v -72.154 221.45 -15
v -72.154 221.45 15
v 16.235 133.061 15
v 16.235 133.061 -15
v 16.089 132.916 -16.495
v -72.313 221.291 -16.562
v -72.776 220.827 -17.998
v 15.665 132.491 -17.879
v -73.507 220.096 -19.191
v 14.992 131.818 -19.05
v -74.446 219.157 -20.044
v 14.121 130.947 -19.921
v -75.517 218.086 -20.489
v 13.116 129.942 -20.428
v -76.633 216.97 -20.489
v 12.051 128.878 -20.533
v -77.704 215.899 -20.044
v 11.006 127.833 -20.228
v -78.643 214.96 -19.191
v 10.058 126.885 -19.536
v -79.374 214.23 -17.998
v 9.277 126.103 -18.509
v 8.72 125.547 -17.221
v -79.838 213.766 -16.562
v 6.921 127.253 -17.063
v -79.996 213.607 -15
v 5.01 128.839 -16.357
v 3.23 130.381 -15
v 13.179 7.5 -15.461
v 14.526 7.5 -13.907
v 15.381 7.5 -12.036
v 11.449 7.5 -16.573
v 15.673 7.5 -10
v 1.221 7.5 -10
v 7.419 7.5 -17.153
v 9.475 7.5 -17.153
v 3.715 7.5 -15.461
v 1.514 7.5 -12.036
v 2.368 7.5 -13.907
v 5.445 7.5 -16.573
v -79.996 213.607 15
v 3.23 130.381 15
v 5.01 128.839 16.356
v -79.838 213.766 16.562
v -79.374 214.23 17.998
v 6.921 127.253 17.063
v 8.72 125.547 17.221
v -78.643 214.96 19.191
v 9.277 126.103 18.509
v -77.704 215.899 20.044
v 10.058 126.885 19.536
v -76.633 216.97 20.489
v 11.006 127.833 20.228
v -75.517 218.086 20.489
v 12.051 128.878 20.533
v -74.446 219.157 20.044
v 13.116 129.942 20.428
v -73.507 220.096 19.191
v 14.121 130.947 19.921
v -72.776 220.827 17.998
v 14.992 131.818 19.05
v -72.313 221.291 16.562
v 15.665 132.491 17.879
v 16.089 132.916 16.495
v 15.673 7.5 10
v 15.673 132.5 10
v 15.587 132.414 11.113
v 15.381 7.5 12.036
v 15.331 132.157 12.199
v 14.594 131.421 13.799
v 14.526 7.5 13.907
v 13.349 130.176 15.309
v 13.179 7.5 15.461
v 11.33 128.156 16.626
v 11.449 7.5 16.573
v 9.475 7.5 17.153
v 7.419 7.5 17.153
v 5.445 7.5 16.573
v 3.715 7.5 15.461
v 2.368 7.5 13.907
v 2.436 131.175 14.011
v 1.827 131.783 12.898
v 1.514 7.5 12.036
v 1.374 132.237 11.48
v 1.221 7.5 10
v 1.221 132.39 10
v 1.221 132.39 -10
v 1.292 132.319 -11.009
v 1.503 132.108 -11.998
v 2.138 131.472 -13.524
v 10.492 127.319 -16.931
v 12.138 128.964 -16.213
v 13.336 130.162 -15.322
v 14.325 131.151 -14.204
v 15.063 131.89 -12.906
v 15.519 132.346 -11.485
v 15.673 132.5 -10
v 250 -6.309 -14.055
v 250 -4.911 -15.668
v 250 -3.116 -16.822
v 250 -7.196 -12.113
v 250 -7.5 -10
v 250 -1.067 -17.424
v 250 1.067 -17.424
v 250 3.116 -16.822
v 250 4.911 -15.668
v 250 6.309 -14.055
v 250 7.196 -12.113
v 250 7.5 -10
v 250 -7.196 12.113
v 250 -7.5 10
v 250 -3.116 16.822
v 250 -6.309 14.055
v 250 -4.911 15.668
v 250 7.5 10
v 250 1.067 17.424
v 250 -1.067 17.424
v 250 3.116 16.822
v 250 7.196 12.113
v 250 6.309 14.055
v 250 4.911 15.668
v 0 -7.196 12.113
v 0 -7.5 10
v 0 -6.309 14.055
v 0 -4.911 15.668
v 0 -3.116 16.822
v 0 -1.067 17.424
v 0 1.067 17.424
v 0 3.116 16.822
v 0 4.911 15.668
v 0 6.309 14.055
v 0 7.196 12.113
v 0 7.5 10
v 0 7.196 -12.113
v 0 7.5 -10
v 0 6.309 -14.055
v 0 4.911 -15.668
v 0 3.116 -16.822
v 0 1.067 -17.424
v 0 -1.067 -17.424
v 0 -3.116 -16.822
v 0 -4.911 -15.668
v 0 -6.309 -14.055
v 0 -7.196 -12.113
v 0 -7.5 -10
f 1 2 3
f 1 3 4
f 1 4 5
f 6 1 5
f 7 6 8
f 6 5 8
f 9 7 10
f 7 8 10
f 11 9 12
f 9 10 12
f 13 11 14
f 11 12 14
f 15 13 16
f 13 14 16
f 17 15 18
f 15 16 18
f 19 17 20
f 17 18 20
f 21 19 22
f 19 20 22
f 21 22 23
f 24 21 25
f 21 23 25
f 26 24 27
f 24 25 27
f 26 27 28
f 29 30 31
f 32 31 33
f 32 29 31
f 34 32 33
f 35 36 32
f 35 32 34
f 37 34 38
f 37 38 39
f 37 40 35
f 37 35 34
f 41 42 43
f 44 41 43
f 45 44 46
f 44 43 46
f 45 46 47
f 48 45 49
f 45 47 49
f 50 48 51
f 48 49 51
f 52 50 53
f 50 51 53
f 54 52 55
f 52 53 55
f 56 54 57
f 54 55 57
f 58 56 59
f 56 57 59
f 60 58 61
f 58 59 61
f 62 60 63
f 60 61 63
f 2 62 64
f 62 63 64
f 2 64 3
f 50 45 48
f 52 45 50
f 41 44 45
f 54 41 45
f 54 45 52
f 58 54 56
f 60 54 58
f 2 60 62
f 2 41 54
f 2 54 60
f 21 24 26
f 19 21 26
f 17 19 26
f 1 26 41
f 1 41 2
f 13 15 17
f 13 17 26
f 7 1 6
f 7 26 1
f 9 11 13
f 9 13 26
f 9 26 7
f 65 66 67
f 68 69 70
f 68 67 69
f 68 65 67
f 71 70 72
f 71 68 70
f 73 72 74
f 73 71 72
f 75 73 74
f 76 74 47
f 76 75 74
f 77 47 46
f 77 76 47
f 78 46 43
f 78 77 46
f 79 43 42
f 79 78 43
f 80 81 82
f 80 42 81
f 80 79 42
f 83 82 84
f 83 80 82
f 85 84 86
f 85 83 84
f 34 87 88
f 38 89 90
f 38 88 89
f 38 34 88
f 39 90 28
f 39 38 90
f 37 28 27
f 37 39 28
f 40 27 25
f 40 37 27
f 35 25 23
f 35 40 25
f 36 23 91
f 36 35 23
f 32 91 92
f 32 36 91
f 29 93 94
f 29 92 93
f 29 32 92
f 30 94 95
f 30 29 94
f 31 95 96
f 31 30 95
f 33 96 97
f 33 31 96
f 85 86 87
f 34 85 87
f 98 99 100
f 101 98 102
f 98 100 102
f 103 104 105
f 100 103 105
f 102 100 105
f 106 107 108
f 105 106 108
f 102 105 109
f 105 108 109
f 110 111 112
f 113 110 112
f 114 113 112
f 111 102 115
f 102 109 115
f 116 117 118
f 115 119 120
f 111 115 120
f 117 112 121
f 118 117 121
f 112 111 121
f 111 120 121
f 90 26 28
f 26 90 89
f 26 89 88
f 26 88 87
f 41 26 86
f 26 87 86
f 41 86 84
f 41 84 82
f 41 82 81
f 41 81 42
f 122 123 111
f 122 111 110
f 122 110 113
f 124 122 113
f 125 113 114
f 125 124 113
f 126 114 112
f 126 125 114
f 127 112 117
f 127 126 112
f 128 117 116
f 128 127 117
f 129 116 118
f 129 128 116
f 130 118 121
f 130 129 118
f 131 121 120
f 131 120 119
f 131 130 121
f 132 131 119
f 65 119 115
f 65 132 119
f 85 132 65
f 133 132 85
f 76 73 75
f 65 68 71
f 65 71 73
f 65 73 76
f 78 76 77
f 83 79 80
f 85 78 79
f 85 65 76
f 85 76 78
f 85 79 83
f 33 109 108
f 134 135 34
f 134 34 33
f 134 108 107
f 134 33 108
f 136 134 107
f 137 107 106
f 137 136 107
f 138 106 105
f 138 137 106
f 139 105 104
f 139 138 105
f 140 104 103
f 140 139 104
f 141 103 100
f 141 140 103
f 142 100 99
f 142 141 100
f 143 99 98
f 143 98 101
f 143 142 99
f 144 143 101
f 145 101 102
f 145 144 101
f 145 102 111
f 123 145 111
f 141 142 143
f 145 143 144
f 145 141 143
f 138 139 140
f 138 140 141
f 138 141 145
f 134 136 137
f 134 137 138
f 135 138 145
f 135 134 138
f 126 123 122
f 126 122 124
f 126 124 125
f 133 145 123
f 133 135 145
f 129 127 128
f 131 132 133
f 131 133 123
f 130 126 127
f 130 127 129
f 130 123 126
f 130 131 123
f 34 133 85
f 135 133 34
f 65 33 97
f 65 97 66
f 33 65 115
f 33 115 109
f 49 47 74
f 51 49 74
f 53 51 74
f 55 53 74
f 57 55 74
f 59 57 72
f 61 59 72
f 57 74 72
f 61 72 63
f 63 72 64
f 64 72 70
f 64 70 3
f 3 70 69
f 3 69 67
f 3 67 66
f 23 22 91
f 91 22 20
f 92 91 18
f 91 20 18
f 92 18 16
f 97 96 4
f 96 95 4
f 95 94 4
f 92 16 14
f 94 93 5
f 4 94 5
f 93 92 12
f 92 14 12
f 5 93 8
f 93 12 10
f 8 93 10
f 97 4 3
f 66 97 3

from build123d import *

# Parameters (mm, degrees)
BOSS_EXTRUDE1_DEPTH = 250
BOSS_EXTRUDE6_DEPTH = 125
BOSS_EXTRUDE7_DEPTH = 125


with BuildPart() as part:
    # Sketch1 → Boss-Extrude1 (new body)
    with BuildSketch(Plane(origin=(0, 0, 0), x_dir=(0, 0, -1), z_dir=(1, 0, 0))):
        with BuildLine():
            Line((-10, 7.5), (10, 7.5))
            ThreePointArc((10, 7.5), (17.5, 0), (10, -7.5))
            Line((10, -7.5), (-10, -7.5))
            ThreePointArc((-10, -7.5), (-17.5, 0), (-10, 7.5))
        make_face()
    extrude(amount=BOSS_EXTRUDE1_DEPTH)

    # Sketch11 → Boss-Extrude6 (add)
    with BuildSketch(Plane(origin=(0, 7.5, 0), x_dir=(1, 0, 0), z_dir=(0, 1, 0))):
        with BuildLine():
            Line((1.220843579, -10), (1.220843579, 10))
            ThreePointArc((1.220843579, 10), (8.447072594, 17.226229015), (15.673301609, 10))
            Line((15.673301609, 10), (15.673301609, -10))
            ThreePointArc((15.673301609, -10), (8.447072594, -17.226229015), (1.220843579, -10))
        make_face()
    extrude(amount=BOSS_EXTRUDE6_DEPTH)

    # Sketch12 → Boss-Extrude7 (add)
    with BuildSketch(Plane(origin=(-58.413349195, 58.413349195, 0), x_dir=(-0.7071067811865476, -0.7071067811865476, 0), z_dir=(0.7071067811865476, -0.7071067811865476, 0))):
        with BuildLine():
            Line((-105.56811993, -15), (-105.56811993, 15))
            ThreePointArc((-105.56811993, 15), (-100.022563681, 20.545556249), (-94.477007433, 15))
            Line((-94.477007433, 15), (-94.477007433, -15))
            ThreePointArc((-94.477007433, -15), (-100.022563681, -20.545556249), (-105.56811993, -15))
        make_face()
    extrude(amount=-BOSS_EXTRUDE7_DEPTH)


solid = part.part
